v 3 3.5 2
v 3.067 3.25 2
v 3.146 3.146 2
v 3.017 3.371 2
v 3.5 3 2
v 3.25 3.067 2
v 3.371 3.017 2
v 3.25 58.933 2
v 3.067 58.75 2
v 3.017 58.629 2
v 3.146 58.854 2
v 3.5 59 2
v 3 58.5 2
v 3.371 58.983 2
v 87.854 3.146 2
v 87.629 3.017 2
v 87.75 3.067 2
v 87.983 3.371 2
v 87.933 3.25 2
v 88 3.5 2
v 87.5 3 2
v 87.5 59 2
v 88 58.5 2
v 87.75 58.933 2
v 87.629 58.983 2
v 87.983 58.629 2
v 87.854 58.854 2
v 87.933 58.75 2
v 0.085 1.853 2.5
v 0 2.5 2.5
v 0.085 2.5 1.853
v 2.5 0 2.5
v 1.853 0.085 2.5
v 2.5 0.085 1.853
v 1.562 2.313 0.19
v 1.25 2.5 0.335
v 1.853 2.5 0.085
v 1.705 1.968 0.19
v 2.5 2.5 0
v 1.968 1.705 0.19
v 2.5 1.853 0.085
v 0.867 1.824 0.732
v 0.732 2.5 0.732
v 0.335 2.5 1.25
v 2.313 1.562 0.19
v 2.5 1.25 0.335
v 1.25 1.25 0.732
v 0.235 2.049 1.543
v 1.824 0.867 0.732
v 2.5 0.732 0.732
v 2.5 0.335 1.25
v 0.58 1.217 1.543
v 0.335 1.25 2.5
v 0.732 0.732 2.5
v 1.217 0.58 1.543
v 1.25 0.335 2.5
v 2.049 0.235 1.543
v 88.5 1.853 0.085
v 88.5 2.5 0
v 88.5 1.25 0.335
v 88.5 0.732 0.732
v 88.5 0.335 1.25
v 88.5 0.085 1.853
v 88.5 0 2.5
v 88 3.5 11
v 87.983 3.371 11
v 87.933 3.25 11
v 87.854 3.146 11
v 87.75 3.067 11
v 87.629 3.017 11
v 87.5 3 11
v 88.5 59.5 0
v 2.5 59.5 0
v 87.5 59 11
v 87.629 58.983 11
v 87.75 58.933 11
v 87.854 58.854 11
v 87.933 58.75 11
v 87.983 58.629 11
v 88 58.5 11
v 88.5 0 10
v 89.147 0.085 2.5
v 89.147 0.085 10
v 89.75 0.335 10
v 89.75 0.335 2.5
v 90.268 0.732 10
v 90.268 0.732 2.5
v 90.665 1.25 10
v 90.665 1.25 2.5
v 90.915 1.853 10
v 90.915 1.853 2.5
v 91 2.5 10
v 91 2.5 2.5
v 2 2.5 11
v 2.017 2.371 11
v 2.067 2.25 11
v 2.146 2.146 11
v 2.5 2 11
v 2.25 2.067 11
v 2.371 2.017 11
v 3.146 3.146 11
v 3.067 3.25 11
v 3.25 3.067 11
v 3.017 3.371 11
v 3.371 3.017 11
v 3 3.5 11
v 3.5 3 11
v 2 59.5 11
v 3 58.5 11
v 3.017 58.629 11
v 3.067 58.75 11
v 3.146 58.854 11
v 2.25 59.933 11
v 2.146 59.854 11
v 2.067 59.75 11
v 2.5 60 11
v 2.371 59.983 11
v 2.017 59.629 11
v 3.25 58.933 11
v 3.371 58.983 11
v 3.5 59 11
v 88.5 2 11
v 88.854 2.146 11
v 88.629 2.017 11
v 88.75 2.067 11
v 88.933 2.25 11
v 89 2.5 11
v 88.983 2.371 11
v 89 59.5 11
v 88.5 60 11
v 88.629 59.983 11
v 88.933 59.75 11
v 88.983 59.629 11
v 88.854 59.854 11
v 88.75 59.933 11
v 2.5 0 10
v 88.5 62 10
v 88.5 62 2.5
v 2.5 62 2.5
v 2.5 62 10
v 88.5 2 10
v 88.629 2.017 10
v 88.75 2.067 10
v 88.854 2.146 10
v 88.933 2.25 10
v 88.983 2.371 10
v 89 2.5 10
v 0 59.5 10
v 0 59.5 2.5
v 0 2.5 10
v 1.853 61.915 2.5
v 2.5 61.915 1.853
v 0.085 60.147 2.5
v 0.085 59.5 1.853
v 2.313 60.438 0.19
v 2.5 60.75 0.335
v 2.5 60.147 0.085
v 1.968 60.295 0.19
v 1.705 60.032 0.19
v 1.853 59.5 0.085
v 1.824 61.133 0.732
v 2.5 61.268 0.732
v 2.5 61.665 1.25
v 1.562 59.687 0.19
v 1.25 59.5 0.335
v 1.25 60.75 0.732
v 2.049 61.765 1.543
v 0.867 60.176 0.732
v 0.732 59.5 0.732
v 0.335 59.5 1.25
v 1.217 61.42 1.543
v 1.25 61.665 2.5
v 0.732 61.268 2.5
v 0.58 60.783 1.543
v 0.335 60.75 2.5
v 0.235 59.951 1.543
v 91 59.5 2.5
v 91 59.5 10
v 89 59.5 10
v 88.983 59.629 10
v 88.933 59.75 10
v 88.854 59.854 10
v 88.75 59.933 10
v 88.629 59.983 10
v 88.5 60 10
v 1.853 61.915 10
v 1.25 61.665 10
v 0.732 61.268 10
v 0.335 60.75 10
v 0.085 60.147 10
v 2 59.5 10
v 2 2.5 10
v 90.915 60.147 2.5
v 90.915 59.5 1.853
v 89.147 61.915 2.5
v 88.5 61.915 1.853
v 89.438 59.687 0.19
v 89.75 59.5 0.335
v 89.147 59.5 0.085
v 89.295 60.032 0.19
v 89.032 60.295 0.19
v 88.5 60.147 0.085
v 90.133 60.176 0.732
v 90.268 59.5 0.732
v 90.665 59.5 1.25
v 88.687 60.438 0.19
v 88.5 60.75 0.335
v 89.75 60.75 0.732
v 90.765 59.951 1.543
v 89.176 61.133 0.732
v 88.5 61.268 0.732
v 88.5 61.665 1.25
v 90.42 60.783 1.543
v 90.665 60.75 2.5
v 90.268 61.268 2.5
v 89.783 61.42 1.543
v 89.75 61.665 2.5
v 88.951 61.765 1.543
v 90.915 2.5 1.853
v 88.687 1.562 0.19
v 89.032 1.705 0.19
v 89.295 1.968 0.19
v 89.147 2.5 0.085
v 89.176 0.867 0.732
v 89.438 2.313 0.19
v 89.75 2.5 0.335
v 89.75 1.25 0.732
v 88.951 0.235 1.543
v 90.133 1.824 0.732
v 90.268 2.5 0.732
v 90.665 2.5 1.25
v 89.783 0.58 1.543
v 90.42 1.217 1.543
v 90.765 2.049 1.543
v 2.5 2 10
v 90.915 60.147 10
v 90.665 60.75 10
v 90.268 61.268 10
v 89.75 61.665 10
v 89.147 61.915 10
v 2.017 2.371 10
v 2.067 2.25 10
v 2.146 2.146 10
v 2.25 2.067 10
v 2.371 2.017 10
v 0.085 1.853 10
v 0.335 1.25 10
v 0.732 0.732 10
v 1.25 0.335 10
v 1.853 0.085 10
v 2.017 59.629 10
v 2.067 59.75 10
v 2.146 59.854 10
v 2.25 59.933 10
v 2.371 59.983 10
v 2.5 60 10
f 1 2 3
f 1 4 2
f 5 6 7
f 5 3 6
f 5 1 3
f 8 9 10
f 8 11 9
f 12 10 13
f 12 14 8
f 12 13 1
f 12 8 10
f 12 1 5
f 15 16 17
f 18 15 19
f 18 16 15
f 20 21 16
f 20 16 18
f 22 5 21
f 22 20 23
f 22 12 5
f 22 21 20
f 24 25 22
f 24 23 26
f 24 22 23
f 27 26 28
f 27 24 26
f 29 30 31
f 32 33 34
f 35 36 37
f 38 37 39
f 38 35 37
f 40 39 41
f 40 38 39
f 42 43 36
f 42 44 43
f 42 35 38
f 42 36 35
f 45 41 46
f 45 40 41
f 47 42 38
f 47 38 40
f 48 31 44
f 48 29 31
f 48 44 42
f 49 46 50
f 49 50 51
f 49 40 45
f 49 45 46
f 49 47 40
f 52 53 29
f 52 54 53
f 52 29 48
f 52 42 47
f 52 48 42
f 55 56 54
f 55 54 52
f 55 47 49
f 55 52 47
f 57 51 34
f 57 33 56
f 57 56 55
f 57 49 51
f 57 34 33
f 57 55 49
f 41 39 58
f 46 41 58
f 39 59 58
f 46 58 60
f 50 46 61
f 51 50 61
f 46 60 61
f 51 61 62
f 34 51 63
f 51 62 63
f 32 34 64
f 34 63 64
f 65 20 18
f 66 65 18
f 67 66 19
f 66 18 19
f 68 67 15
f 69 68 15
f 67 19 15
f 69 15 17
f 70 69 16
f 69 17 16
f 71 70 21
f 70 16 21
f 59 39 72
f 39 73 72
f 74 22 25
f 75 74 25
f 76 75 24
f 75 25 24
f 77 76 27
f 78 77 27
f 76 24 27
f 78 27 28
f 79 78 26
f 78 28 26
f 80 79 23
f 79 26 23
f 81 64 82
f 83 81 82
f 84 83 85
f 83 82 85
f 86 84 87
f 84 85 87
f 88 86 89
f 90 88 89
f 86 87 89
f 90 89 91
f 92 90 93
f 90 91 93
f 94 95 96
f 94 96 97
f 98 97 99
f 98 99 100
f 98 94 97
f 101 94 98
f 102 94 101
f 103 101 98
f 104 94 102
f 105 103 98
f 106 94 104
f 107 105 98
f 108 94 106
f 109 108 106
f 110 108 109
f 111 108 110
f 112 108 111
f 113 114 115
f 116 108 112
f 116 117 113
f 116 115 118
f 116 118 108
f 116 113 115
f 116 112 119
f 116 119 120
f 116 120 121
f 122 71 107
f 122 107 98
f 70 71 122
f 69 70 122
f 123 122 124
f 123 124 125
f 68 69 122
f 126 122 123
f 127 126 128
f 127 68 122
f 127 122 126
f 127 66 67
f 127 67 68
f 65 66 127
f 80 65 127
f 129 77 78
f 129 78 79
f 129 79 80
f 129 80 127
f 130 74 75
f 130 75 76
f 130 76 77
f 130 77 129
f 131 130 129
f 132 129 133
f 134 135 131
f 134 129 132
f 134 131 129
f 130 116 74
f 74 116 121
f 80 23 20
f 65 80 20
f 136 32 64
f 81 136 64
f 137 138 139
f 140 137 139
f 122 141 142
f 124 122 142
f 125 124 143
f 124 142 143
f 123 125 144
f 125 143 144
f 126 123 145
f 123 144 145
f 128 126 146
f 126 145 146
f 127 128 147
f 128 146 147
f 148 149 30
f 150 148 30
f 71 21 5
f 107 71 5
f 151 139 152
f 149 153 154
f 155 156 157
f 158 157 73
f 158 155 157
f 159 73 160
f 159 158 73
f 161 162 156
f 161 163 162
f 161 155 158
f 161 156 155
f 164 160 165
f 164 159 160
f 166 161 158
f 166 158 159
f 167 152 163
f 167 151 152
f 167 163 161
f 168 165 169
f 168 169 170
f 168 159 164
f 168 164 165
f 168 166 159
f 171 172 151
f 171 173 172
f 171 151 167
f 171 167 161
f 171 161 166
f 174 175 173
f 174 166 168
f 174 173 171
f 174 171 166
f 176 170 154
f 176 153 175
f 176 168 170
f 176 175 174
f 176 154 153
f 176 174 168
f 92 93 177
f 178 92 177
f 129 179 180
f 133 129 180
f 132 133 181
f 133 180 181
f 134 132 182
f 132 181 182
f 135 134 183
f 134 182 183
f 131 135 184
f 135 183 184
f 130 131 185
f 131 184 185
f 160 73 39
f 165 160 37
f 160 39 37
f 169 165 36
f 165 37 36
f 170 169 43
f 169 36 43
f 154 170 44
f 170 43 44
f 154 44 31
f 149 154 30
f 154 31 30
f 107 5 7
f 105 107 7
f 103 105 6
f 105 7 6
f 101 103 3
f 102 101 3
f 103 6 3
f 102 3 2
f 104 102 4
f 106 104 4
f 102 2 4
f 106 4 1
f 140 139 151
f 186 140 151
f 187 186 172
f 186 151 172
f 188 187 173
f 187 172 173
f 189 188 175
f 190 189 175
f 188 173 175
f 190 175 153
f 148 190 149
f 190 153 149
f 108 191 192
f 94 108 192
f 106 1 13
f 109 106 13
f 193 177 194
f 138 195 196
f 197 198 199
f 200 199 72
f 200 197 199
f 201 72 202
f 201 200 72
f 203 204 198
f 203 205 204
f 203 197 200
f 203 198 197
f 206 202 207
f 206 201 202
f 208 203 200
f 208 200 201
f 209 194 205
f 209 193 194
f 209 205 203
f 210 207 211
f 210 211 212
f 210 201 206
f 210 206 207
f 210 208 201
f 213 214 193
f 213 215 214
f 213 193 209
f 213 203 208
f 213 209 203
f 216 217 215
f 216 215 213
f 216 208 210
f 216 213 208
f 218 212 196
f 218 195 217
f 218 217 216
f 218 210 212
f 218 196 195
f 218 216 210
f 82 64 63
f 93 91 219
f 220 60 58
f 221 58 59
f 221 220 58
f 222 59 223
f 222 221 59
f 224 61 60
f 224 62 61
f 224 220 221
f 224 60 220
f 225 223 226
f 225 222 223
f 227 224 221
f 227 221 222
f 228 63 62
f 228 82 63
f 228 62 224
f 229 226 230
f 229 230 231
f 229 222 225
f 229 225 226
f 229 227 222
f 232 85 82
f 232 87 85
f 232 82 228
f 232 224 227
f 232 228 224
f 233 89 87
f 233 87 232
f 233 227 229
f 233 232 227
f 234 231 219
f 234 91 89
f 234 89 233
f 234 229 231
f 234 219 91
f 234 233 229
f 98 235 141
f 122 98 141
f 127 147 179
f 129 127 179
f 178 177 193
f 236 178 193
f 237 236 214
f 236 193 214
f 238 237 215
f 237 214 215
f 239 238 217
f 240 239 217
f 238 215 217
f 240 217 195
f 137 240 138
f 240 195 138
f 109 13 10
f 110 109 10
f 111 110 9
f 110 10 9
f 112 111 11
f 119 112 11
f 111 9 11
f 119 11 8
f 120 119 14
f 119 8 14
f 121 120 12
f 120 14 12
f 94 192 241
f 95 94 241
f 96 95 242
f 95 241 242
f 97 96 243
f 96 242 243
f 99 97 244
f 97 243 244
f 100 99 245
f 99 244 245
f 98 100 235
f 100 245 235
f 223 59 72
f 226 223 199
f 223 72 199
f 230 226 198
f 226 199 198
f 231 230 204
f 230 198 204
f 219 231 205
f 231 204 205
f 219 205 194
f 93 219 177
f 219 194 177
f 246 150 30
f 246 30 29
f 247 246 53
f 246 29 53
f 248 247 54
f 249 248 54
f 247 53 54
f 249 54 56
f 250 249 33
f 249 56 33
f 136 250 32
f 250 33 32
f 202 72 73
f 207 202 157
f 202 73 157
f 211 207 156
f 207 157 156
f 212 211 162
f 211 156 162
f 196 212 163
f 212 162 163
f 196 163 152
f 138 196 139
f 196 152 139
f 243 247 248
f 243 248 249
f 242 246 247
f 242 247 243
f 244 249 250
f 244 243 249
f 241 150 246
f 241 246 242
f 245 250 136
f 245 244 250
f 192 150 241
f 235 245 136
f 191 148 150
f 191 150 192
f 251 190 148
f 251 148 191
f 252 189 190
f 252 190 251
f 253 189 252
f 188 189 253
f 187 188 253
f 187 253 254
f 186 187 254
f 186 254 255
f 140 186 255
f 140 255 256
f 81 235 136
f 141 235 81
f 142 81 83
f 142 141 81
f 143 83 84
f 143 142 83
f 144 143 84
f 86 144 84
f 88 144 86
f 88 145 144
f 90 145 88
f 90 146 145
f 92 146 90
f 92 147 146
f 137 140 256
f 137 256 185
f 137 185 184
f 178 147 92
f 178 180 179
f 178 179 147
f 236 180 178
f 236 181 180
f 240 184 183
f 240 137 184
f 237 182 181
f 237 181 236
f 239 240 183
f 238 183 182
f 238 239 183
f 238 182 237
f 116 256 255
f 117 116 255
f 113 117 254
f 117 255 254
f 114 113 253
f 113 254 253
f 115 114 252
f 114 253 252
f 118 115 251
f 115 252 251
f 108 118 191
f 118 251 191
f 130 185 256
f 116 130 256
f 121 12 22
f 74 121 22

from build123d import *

# Parameters (mm, degrees)
F1_DEPTH = 2
F2_DEPTH = 10
F3_DEPTH = 11
F4_R     = 2.5


with BuildPart() as f1:
    # F0 (on Top) → F1 (new body)
    with BuildSketch(Plane.XY):
        with BuildLine():
            ThreePointArc((0, 2.5), (0.732233047, 0.732233047), (2.5, 0))
            Line((2.5, 0), (88.5, 0))
            ThreePointArc((88.5, 0), (90.267766953, 0.732233047), (91, 2.5))
            Line((91, 2.5), (91, 59.5))
            ThreePointArc((91, 59.5), (90.267766953, 61.267766953), (88.5, 62))
            Line((88.5, 62), (2.5, 62))
            ThreePointArc((2.5, 62), (0.732233047, 61.267766953), (0, 59.5))
            Line((0, 59.5), (0, 2.5))
        make_face()
        with BuildLine():
            Line((2, 2.5), (2, 59.5))
            ThreePointArc((2, 59.5), (2.1464466094, 59.8535533906), (2.5, 60))
            Line((2.5, 60), (88.5, 60))
            ThreePointArc((88.5, 60), (88.8535533906, 59.8535533906), (89, 59.5))
            Line((89, 59.5), (89, 2.5))
            ThreePointArc((89, 2.5), (88.8535533906, 2.1464466094), (88.5, 2))
            Line((88.5, 2), (2.5, 2))
            ThreePointArc((2.5, 2), (2.1464466094, 2.1464466094), (2, 2.5))
        make_face(mode=Mode.SUBTRACT)
        with BuildLine():
            ThreePointArc((2.5, 60), (2.1464466094, 59.8535533906), (2, 59.5))
            Line((2, 59.5), (2, 2.5))
            ThreePointArc((2, 2.5), (2.1464466094, 2.1464466094), (2.5, 2))
            Line((2.5, 2), (88.5, 2))
            ThreePointArc((88.5, 2), (88.8535533906, 2.1464466094), (89, 2.5))
            Line((89, 2.5), (89, 59.5))
            ThreePointArc((89, 59.5), (88.8535533906, 59.8535533906), (88.5, 60))
            Line((88.5, 60), (2.5, 60))
        make_face()
        with BuildLine():
            Line((3.5, 59), (87.5, 59))
            ThreePointArc((87.5, 59), (87.8535533906, 58.8535533906), (88, 58.5))
            Line((88, 58.5), (88, 3.5))
            ThreePointArc((88, 3.5), (87.8535533906, 3.1464466094), (87.5, 3))
            Line((87.5, 3), (3.5, 3))
            ThreePointArc((3.5, 3), (3.1464466094, 3.1464466094), (3, 3.5))
            Line((3, 3.5), (3, 58.5))
            ThreePointArc((3, 58.5), (3.1464466094, 58.8535533906), (3.5, 59))
        make_face(mode=Mode.SUBTRACT)
        with BuildLine():
            ThreePointArc((88, 58.5), (87.8535533906, 58.8535533906), (87.5, 59))
            Line((87.5, 59), (3.5, 59))
            ThreePointArc((3.5, 59), (3.1464466094, 58.8535533906), (3, 58.5))
            Line((3, 58.5), (3, 3.5))
            ThreePointArc((3, 3.5), (3.1464466094, 3.1464466094), (3.5, 3))
            Line((3.5, 3), (87.5, 3))
            ThreePointArc((87.5, 3), (87.8535533906, 3.1464466094), (88, 3.5))
            Line((88, 3.5), (88, 58.5))
        make_face()
    extrude(amount=F1_DEPTH)

    # F0 (on Top) → F2 (join)
    with BuildSketch(Plane.XY):
        with BuildLine():
            ThreePointArc((0, 2.5), (0.732233047, 0.732233047), (2.5, 0))
            Line((2.5, 0), (88.5, 0))
            ThreePointArc((88.5, 0), (90.267766953, 0.732233047), (91, 2.5))
            Line((91, 2.5), (91, 59.5))
            ThreePointArc((91, 59.5), (90.267766953, 61.267766953), (88.5, 62))
            Line((88.5, 62), (2.5, 62))
            ThreePointArc((2.5, 62), (0.732233047, 61.267766953), (0, 59.5))
            Line((0, 59.5), (0, 2.5))
        make_face()
        with BuildLine():
            Line((2, 2.5), (2, 59.5))
            ThreePointArc((2, 59.5), (2.1464466094, 59.8535533906), (2.5, 60))
            Line((2.5, 60), (88.5, 60))
            ThreePointArc((88.5, 60), (88.8535533906, 59.8535533906), (89, 59.5))
            Line((89, 59.5), (89, 2.5))
            ThreePointArc((89, 2.5), (88.8535533906, 2.1464466094), (88.5, 2))
            Line((88.5, 2), (2.5, 2))
            ThreePointArc((2.5, 2), (2.1464466094, 2.1464466094), (2, 2.5))
        make_face(mode=Mode.SUBTRACT)
    extrude(amount=F2_DEPTH)

    # F0 (on Top) → F3 (join)
    with BuildSketch(Plane.XY):
        with BuildLine():
            ThreePointArc((2.5, 60), (2.1464466094, 59.8535533906), (2, 59.5))
            Line((2, 59.5), (2, 2.5))
            ThreePointArc((2, 2.5), (2.1464466094, 2.1464466094), (2.5, 2))
            Line((2.5, 2), (88.5, 2))
            ThreePointArc((88.5, 2), (88.8535533906, 2.1464466094), (89, 2.5))
            Line((89, 2.5), (89, 59.5))
            ThreePointArc((89, 59.5), (88.8535533906, 59.8535533906), (88.5, 60))
            Line((88.5, 60), (2.5, 60))
        make_face()
        with BuildLine():
            Line((3.5, 59), (87.5, 59))
            ThreePointArc((87.5, 59), (87.8535533906, 58.8535533906), (88, 58.5))
            Line((88, 58.5), (88, 3.5))
            ThreePointArc((88, 3.5), (87.8535533906, 3.1464466094), (87.5, 3))
            Line((87.5, 3), (3.5, 3))
            ThreePointArc((3.5, 3), (3.1464466094, 3.1464466094), (3, 3.5))
            Line((3, 3.5), (3, 58.5))
            ThreePointArc((3, 58.5), (3.1464466094, 58.8535533906), (3.5, 59))
        make_face(mode=Mode.SUBTRACT)
    extrude(amount=F3_DEPTH)

    # F4
    f4_edges = [f1.edges().sort_by_distance(p)[0] for p in [
        (45.5, 0, 0),
    ]]
    fillet(f4_edges, radius=F4_R)


solid = f1.part
